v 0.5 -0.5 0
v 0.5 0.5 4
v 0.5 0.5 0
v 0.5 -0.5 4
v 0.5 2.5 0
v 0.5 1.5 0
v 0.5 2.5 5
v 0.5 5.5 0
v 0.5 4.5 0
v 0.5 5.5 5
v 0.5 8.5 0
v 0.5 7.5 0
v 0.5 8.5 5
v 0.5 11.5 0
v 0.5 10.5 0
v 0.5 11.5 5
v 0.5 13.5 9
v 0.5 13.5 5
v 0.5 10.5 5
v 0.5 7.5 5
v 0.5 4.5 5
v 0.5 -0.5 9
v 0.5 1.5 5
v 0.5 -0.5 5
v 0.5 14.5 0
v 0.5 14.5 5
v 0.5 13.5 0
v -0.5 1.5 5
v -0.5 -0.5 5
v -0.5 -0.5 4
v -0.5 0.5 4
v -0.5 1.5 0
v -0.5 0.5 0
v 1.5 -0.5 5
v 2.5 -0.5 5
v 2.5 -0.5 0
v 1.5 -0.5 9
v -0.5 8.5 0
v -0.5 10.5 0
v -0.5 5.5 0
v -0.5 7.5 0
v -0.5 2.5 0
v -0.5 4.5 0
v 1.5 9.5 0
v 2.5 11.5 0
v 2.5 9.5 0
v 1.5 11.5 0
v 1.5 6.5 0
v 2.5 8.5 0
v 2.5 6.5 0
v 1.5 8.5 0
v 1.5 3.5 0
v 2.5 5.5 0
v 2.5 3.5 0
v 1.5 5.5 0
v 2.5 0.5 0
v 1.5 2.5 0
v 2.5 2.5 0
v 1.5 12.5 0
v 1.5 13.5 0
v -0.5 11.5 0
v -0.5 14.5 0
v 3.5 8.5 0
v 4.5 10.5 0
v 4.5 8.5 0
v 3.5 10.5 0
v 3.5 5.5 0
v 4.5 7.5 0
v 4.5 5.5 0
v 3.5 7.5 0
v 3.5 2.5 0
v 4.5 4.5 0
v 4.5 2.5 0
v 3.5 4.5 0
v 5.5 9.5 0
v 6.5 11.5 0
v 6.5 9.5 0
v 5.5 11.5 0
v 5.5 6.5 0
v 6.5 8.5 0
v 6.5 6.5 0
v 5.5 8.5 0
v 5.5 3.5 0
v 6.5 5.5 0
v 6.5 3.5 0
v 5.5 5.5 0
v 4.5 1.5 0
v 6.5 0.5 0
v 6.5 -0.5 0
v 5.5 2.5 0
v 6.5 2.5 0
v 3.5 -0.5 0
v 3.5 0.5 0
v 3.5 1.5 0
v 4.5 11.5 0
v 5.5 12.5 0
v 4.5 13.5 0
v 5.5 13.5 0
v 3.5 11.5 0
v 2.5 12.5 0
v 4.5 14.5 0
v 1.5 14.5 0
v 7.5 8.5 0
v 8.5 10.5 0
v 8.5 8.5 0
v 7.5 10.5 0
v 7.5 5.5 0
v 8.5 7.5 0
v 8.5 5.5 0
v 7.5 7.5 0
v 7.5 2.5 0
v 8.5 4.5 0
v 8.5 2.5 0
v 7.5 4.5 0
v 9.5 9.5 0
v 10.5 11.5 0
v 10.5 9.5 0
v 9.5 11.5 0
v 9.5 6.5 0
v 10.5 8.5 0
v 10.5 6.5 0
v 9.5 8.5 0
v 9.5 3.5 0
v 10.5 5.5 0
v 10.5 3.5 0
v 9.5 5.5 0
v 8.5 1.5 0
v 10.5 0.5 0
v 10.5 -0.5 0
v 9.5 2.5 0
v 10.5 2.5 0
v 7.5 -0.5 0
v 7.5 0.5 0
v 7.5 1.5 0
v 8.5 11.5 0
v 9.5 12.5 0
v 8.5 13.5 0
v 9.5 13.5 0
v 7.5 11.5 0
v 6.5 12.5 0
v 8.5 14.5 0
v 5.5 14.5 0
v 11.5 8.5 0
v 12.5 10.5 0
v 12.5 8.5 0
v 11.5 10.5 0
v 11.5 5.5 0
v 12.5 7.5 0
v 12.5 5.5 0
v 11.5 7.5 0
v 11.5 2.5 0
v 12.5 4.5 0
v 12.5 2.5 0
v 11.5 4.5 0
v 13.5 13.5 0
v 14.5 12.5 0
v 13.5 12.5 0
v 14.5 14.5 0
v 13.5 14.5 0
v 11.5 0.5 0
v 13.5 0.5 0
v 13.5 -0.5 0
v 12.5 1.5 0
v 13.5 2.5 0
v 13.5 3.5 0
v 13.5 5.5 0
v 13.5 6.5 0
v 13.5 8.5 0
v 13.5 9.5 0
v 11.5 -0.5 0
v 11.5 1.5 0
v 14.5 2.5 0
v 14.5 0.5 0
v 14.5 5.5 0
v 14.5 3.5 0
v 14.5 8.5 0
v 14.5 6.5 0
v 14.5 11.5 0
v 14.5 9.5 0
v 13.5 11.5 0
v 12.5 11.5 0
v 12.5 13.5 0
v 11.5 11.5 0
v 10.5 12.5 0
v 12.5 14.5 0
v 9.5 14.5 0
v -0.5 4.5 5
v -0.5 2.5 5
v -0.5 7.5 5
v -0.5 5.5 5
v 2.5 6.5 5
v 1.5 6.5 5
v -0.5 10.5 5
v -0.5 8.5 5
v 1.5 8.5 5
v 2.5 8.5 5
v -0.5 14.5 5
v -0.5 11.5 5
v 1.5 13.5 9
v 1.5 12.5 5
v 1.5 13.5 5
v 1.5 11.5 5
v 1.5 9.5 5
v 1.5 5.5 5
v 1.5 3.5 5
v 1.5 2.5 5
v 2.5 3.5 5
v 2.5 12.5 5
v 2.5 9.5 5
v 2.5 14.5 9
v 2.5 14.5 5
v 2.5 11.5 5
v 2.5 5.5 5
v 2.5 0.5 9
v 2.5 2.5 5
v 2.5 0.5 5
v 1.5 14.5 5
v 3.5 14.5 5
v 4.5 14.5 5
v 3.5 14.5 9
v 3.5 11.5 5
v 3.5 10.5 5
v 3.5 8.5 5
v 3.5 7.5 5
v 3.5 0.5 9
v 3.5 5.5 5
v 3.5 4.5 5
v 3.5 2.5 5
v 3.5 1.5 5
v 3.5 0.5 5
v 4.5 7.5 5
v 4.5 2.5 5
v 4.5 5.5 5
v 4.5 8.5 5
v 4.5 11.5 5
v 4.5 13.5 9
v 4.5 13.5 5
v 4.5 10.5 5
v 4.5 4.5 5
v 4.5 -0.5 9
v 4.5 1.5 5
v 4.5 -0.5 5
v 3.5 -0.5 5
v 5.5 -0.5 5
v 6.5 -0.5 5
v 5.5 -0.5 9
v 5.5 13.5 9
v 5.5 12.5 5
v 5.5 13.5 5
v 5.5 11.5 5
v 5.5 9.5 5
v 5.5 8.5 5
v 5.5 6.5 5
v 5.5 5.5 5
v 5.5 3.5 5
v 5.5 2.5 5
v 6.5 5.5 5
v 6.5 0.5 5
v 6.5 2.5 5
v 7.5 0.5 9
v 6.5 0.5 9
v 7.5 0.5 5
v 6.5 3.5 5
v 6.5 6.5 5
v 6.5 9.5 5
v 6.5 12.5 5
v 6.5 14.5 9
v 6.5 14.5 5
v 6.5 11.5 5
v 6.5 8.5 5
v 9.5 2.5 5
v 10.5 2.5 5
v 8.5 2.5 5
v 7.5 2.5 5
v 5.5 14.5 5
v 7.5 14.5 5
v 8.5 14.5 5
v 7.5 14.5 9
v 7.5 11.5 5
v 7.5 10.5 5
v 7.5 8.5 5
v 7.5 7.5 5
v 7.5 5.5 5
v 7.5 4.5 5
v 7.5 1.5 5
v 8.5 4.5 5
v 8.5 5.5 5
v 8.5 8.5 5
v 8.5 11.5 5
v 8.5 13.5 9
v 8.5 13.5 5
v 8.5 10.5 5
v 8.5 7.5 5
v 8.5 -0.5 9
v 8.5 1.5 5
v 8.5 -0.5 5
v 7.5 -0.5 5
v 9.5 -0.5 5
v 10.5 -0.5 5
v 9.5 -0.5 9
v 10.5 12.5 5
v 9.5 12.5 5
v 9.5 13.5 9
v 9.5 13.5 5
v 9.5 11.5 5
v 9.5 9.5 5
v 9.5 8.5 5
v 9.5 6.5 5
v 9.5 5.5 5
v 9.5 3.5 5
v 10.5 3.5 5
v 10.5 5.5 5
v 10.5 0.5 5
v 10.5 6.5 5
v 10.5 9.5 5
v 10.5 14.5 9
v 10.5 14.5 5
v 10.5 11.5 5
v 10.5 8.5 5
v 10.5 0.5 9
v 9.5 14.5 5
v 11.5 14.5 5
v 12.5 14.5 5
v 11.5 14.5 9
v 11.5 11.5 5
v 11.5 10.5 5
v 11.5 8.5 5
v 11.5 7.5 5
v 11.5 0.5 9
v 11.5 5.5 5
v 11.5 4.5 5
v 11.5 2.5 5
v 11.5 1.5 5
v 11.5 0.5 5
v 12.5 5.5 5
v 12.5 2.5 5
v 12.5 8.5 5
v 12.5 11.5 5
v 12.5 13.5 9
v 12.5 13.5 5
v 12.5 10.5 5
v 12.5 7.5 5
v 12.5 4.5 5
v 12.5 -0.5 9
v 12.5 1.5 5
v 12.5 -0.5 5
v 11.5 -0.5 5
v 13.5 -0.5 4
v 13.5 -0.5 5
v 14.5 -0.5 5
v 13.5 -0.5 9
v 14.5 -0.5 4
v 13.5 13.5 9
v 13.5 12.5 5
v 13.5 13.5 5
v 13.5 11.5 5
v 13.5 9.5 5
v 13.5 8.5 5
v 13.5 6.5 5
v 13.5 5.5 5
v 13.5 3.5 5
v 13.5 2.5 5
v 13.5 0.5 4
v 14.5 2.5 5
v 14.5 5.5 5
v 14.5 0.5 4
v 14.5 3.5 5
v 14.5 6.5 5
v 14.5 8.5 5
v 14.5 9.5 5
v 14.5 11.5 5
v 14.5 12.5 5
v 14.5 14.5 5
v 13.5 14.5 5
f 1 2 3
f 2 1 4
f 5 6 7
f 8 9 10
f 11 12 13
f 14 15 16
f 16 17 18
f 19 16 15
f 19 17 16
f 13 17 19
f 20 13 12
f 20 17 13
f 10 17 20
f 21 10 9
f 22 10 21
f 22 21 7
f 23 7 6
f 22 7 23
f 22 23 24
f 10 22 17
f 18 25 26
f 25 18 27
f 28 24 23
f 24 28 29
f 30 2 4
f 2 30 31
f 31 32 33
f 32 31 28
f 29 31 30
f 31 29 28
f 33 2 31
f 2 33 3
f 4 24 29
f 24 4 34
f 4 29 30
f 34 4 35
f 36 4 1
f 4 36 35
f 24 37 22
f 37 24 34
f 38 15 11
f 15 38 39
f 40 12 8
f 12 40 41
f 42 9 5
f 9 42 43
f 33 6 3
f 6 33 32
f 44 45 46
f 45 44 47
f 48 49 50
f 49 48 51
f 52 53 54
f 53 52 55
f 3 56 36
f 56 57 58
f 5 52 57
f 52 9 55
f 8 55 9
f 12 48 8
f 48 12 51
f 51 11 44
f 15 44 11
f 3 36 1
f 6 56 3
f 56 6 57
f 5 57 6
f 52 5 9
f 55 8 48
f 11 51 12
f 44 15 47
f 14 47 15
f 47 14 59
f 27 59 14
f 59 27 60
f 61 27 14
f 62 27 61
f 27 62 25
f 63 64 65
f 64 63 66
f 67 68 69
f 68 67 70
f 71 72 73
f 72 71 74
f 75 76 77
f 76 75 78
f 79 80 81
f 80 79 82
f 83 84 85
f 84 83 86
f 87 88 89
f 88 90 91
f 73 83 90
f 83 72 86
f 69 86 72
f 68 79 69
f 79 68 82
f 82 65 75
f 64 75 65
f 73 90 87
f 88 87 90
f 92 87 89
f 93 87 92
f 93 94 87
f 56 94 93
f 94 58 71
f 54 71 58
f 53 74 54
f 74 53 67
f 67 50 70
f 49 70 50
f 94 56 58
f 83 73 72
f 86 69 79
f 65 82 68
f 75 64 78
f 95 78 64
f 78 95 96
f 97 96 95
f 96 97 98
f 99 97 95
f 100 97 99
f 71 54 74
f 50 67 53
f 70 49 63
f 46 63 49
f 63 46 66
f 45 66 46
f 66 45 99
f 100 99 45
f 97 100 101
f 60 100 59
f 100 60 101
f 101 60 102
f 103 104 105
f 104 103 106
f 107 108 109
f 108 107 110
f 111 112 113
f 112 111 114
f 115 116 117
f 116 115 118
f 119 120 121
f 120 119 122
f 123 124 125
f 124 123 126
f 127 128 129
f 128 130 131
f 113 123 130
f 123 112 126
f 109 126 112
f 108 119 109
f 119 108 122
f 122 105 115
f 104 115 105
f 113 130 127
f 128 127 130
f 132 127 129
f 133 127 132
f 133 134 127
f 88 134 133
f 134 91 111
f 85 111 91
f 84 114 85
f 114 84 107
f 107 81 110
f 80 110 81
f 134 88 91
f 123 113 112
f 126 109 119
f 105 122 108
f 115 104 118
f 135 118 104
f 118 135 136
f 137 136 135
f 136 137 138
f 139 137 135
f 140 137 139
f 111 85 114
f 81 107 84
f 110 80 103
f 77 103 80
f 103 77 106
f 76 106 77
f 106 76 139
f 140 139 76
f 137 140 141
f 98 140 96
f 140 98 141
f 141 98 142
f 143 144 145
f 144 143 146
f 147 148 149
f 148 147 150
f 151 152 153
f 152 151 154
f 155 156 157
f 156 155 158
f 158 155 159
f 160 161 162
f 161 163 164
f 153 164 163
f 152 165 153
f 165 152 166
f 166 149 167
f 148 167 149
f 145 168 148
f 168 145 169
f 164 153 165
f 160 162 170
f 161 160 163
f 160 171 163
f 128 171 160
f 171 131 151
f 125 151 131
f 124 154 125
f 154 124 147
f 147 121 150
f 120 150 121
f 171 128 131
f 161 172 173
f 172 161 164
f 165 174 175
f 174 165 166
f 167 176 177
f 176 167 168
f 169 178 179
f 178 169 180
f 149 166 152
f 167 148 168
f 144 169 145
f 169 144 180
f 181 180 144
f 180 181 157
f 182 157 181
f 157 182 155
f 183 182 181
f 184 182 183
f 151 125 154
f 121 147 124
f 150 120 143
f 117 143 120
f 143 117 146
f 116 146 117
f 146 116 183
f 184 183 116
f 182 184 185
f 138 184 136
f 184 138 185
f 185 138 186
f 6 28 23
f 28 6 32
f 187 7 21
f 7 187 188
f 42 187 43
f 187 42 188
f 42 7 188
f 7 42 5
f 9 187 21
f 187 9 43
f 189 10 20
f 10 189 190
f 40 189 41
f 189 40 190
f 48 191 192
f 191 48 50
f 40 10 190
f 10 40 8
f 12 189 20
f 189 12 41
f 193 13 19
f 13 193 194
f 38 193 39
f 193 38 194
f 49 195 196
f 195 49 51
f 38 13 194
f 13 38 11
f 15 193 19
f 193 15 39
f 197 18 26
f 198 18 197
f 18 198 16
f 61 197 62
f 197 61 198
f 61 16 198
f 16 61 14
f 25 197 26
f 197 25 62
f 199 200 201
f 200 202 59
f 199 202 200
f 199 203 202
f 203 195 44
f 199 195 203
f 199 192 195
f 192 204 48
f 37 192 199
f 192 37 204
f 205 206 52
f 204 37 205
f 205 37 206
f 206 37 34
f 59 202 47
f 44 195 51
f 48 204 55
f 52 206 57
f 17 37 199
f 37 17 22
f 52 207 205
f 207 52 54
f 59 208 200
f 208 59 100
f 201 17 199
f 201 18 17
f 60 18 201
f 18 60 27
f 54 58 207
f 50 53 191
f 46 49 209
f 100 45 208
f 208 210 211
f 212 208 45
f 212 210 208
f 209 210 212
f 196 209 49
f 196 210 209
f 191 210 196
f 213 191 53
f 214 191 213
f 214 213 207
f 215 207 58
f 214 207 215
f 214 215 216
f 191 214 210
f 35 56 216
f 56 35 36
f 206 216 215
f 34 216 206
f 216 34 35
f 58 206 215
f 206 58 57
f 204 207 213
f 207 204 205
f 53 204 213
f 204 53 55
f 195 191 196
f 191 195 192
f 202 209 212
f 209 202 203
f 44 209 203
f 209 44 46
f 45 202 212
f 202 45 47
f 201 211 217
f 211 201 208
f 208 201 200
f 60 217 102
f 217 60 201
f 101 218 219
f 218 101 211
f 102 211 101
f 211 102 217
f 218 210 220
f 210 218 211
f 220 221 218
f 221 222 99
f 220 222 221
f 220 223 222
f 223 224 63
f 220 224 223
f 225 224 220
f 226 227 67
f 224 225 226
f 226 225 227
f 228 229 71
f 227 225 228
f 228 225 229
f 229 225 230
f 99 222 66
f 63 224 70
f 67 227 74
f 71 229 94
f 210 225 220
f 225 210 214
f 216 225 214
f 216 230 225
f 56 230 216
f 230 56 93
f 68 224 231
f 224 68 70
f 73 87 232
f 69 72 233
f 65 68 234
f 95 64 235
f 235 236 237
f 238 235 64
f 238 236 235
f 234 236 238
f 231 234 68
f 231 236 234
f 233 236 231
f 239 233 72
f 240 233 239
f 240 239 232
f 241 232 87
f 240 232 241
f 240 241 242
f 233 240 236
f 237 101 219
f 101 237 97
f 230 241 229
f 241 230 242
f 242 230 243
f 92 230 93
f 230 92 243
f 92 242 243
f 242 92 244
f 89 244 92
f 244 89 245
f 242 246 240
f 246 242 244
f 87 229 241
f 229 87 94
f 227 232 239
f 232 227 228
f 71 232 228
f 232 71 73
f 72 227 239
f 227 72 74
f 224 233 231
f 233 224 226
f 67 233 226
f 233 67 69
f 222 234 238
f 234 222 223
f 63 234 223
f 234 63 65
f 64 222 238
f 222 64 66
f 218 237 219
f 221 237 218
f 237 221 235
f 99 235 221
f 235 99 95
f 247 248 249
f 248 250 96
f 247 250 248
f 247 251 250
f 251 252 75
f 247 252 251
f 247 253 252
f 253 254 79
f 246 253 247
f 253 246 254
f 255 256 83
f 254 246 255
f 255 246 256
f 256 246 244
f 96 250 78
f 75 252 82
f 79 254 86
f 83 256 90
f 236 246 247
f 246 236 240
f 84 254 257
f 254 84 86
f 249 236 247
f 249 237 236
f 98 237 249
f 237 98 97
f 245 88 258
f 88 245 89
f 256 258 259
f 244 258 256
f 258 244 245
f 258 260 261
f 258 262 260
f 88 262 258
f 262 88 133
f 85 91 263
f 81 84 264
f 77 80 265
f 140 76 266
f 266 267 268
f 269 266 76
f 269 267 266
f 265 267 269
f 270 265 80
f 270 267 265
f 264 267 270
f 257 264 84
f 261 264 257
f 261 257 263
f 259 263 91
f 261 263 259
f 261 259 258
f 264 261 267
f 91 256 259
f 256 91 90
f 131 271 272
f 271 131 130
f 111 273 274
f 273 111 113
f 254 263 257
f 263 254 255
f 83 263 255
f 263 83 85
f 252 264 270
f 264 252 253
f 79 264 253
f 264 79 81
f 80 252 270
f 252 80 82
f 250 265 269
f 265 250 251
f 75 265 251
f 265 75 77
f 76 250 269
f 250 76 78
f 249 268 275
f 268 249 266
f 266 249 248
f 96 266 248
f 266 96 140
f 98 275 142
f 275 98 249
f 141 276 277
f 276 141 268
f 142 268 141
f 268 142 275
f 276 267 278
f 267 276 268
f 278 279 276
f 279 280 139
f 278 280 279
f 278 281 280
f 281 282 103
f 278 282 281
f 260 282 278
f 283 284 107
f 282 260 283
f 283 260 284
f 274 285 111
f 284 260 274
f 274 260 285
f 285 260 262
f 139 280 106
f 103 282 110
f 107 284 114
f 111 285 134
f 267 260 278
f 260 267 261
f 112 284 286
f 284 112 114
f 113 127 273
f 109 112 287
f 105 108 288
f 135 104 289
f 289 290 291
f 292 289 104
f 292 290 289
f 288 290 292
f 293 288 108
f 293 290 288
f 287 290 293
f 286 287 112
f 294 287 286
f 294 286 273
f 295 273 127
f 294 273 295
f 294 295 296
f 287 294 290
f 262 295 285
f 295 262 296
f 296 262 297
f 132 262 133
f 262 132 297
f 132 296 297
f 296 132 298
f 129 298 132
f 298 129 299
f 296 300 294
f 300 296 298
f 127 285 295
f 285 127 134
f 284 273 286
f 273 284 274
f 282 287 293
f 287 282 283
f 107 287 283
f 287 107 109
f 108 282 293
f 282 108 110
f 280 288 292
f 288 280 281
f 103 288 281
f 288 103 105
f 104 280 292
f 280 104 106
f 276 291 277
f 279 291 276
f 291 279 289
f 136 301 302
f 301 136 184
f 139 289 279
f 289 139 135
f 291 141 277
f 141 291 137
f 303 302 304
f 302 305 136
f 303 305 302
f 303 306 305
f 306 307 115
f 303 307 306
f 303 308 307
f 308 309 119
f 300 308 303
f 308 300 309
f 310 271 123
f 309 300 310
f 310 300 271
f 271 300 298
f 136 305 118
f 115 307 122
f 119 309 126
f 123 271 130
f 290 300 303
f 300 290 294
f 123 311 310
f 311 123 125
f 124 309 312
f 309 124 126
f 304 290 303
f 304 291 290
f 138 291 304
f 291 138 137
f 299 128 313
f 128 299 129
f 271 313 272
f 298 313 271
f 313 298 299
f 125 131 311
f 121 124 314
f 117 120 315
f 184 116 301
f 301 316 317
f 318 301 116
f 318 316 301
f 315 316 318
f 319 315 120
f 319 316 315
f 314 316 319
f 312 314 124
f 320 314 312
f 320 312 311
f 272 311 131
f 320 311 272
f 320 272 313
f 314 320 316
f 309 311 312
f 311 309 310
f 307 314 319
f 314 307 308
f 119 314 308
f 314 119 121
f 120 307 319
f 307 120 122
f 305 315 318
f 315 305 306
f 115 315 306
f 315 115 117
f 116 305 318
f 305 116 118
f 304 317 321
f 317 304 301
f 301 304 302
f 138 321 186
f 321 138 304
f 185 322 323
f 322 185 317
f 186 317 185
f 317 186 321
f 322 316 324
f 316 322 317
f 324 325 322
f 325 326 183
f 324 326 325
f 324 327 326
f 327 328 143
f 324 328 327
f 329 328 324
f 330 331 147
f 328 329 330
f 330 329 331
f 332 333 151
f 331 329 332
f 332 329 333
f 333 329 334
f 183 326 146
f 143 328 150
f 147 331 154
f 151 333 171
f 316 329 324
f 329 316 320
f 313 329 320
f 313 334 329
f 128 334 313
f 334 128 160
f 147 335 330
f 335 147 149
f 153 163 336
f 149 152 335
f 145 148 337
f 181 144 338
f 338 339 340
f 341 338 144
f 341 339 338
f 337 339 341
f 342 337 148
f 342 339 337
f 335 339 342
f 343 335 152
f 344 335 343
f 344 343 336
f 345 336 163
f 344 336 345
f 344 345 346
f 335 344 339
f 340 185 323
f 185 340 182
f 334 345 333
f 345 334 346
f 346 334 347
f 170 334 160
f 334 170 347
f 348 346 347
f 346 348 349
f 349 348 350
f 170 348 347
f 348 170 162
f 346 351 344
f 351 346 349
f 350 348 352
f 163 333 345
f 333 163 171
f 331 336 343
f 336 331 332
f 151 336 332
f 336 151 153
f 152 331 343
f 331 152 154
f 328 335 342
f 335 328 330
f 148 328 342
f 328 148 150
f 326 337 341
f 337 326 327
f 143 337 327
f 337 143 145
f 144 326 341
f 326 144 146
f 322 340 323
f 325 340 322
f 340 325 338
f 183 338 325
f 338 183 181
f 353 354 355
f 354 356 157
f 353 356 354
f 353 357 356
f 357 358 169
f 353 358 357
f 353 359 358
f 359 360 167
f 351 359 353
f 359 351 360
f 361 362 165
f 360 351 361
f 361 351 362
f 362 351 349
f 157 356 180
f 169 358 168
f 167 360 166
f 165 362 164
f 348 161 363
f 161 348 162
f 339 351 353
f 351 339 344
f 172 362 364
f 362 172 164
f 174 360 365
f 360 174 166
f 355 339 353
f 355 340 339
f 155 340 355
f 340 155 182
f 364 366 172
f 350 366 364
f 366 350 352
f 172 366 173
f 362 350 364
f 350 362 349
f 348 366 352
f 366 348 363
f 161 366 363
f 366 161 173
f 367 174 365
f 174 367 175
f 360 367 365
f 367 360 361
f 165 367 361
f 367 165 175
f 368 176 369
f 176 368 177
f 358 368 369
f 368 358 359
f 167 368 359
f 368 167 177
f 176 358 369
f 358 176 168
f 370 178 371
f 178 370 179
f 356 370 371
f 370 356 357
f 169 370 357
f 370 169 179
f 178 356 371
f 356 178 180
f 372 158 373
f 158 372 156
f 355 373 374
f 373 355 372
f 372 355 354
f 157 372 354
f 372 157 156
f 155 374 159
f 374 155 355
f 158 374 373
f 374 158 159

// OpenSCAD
union() {
    translate([0, 0, 4.5]) color([1, 0, 0]) cube([1, 1, 1], center=true);
    translate([0, 1, 2.5]) cube([1, 1, 5], center=true);
    translate([0, 3, 2.5]) cube([1, 1, 5], center=true);
    translate([0, 4, 2.5]) cube([1, 1, 5], center=true);
    translate([0, 6, 2.5]) cube([1, 1, 5], center=true);
    translate([0, 7, 2.5]) cube([1, 1, 5], center=true);
    translate([0, 9, 2.5]) cube([1, 1, 5], center=true);
    translate([0, 10, 2.5]) cube([1, 1, 5], center=true);
    translate([0, 12, 2.5]) cube([1, 1, 5], center=true);
    translate([0, 13, 2.5]) cube([1, 1, 5], center=true);
    translate([0, 14, 2.5]) cube([1, 1, 5], center=true);
    translate([1, 0, 4.5]) cube([1, 1, 9], center=true);
    translate([1, 1, 4.5]) cube([1, 1, 9], center=true);
    translate([1, 2, 4.5]) cube([1, 1, 9], center=true);
    translate([1, 3, 4.5]) cube([1, 1, 9], center=true);
    translate([1, 4, 4.5]) cube([1, 1, 9], center=true);
    translate([1, 5, 4.5]) cube([1, 1, 9], center=true);
    translate([1, 6, 4.5]) cube([1, 1, 9], center=true);
    translate([1, 7, 4.5]) cube([1, 1, 9], center=true);
    translate([1, 8, 4.5]) cube([1, 1, 9], center=true);
    translate([1, 9, 4.5]) cube([1, 1, 9], center=true);
    translate([1, 10, 4.5]) cube([1, 1, 9], center=true);
    translate([1, 11, 4.5]) cube([1, 1, 9], center=true);
    translate([1, 12, 4.5]) cube([1, 1, 9], center=true);
    translate([1, 13, 4.5]) cube([1, 1, 9], center=true);
    translate([2, 0, 2.5]) cube([1, 1, 5], center=true);
    translate([2, 1, 2.5]) cube([1, 1, 5], center=true);
    translate([2, 2, 2.5]) cube([1, 1, 5], center=true);
    translate([2, 4, 2.5]) cube([1, 1, 5], center=true);
    translate([2, 5, 2.5]) cube([1, 1, 5], center=true);
    translate([2, 7, 2.5]) cube([1, 1, 5], center=true);
    translate([2, 8, 2.5]) cube([1, 1, 5], center=true);
    translate([2, 10, 2.5]) cube([1, 1, 5], center=true);
    translate([2, 11, 2.5]) cube([1, 1, 5], center=true);
    translate([2, 13, 2.5]) cube([1, 1, 5], center=true);
    translate([2, 14, 2.5]) cube([1, 1, 5], center=true);
    translate([3, 1, 4.5]) cube([1, 1, 9], center=true);
    translate([3, 2, 4.5]) cube([1, 1, 9], center=true);
    translate([3, 3, 4.5]) cube([1, 1, 9], center=true);
    translate([3, 4, 4.5]) cube([1, 1, 9], center=true);
    translate([3, 5, 4.5]) cube([1, 1, 9], center=true);
    translate([3, 6, 4.5]) cube([1, 1, 9], center=true);
    translate([3, 7, 4.5]) cube([1, 1, 9], center=true);
    translate([3, 8, 4.5]) cube([1, 1, 9], center=true);
    translate([3, 9, 4.5]) cube([1, 1, 9], center=true);
    translate([3, 10, 4.5]) cube([1, 1, 9], center=true);
    translate([3, 11, 4.5]) cube([1, 1, 9], center=true);
    translate([3, 12, 4.5]) cube([1, 1, 9], center=true);
    translate([3, 13, 4.5]) cube([1, 1, 9], center=true);
    translate([3, 14, 4.5]) cube([1, 1, 9], center=true);
    translate([4, 0, 2.5]) cube([1, 1, 5], center=true);
    translate([4, 1, 2.5]) cube([1, 1, 5], center=true);
    translate([4, 3, 2.5]) cube([1, 1, 5], center=true);
    translate([4, 4, 2.5]) cube([1, 1, 5], center=true);
    translate([4, 6, 2.5]) cube([1, 1, 5], center=true);
    translate([4, 7, 2.5]) cube([1, 1, 5], center=true);
    translate([4, 9, 2.5]) cube([1, 1, 5], center=true);
    translate([4, 10, 2.5]) cube([1, 1, 5], center=true);
    translate([4, 12, 2.5]) cube([1, 1, 5], center=true);
    translate([4, 13, 2.5]) cube([1, 1, 5], center=true);
    translate([4, 14, 2.5]) cube([1, 1, 5], center=true);
    translate([5, 0, 4.5]) cube([1, 1, 9], center=true);
    translate([5, 1, 4.5]) cube([1, 1, 9], center=true);
    translate([5, 2, 4.5]) cube([1, 1, 9], center=true);
    translate([5, 3, 4.5]) cube([1, 1, 9], center=true);
    translate([5, 4, 4.5]) cube([1, 1, 9], center=true);
    translate([5, 5, 4.5]) cube([1, 1, 9], center=true);
    translate([5, 6, 4.5]) cube([1, 1, 9], center=true);
    translate([5, 7, 4.5]) cube([1, 1, 9], center=true);
    translate([5, 8, 4.5]) cube([1, 1, 9], center=true);
    translate([5, 9, 4.5]) cube([1, 1, 9], center=true);
    translate([5, 10, 4.5]) cube([1, 1, 9], center=true);
    translate([5, 11, 4.5]) cube([1, 1, 9], center=true);
    translate([5, 12, 4.5]) cube([1, 1, 9], center=true);
    translate([5, 13, 4.5]) cube([1, 1, 9], center=true);
    translate([6, 0, 2.5]) cube([1, 1, 5], center=true);
    translate([6, 1, 2.5]) cube([1, 1, 5], center=true);
    translate([6, 2, 2.5]) cube([1, 1, 5], center=true);
    translate([6, 4, 2.5]) cube([1, 1, 5], center=true);
    translate([6, 5, 2.5]) cube([1, 1, 5], center=true);
    translate([6, 7, 2.5]) cube([1, 1, 5], center=true);
    translate([6, 8, 2.5]) cube([1, 1, 5], center=true);
    translate([6, 10, 2.5]) cube([1, 1, 5], center=true);
    translate([6, 11, 2.5]) cube([1, 1, 5], center=true);
    translate([6, 13, 2.5]) cube([1, 1, 5], center=true);
    translate([6, 14, 2.5]) cube([1, 1, 5], center=true);
    translate([7, 1, 4.5]) cube([1, 1, 9], center=true);
    translate([7, 2, 4.5]) cube([1, 1, 9], center=true);
    translate([7, 3, 4.5]) cube([1, 1, 9], center=true);
    translate([7, 4, 4.5]) cube([1, 1, 9], center=true);
    translate([7, 5, 4.5]) cube([1, 1, 9], center=true);
    translate([7, 6, 4.5]) cube([1, 1, 9], center=true);
    translate([7, 7, 4.5]) cube([1, 1, 9], center=true);
    translate([7, 8, 4.5]) cube([1, 1, 9], center=true);
    translate([7, 9, 4.5]) cube([1, 1, 9], center=true);
    translate([7, 10, 4.5]) cube([1, 1, 9], center=true);
    translate([7, 11, 4.5]) cube([1, 1, 9], center=true);
    translate([7, 12, 4.5]) cube([1, 1, 9], center=true);
    translate([7, 13, 4.5]) cube([1, 1, 9], center=true);
    translate([7, 14, 4.5]) cube([1, 1, 9], center=true);
    translate([8, 0, 2.5]) cube([1, 1, 5], center=true);
    translate([8, 1, 2.5]) cube([1, 1, 5], center=true);
    translate([8, 3, 2.5]) cube([1, 1, 5], center=true);
    translate([8, 4, 2.5]) cube([1, 1, 5], center=true);
    translate([8, 6, 2.5]) cube([1, 1, 5], center=true);
    translate([8, 7, 2.5]) cube([1, 1, 5], center=true);
    translate([8, 9, 2.5]) cube([1, 1, 5], center=true);
    translate([8, 10, 2.5]) cube([1, 1, 5], center=true);
    translate([8, 12, 2.5]) cube([1, 1, 5], center=true);
    translate([8, 13, 2.5]) cube([1, 1, 5], center=true);
    translate([8, 14, 2.5]) cube([1, 1, 5], center=true);
    translate([9, 0, 4.5]) cube([1, 1, 9], center=true);
    translate([9, 1, 4.5]) cube([1, 1, 9], center=true);
    translate([9, 2, 4.5]) cube([1, 1, 9], center=true);
    translate([9, 3, 4.5]) cube([1, 1, 9], center=true);
    translate([9, 4, 4.5]) cube([1, 1, 9], center=true);
    translate([9, 5, 4.5]) cube([1, 1, 9], center=true);
    translate([9, 6, 4.5]) cube([1, 1, 9], center=true);
    translate([9, 7, 4.5]) cube([1, 1, 9], center=true);
    translate([9, 8, 4.5]) cube([1, 1, 9], center=true);
    translate([9, 9, 4.5]) cube([1, 1, 9], center=true);
    translate([9, 10, 4.5]) cube([1, 1, 9], center=true);
    translate([9, 11, 4.5]) cube([1, 1, 9], center=true);
    translate([9, 12, 4.5]) cube([1, 1, 9], center=true);
    translate([9, 13, 4.5]) cube([1, 1, 9], center=true);
    translate([10, 0, 2.5]) cube([1, 1, 5], center=true);
    translate([10, 1, 2.5]) cube([1, 1, 5], center=true);
    translate([10, 2, 2.5]) cube([1, 1, 5], center=true);
    translate([10, 4, 2.5]) cube([1, 1, 5], center=true);
    translate([10, 5, 2.5]) cube([1, 1, 5], center=true);
    translate([10, 7, 2.5]) cube([1, 1, 5], center=true);
    translate([10, 8, 2.5]) cube([1, 1, 5], center=true);
    translate([10, 10, 2.5]) cube([1, 1, 5], center=true);
    translate([10, 11, 2.5]) cube([1, 1, 5], center=true);
    translate([10, 13, 2.5]) cube([1, 1, 5], center=true);
    translate([10, 14, 2.5]) cube([1, 1, 5], center=true);
    translate([11, 1, 4.5]) cube([1, 1, 9], center=true);
    translate([11, 2, 4.5]) cube([1, 1, 9], center=true);
    translate([11, 3, 4.5]) cube([1, 1, 9], center=true);
    translate([11, 4, 4.5]) cube([1, 1, 9], center=true);
    translate([11, 5, 4.5]) cube([1, 1, 9], center=true);
    translate([11, 6, 4.5]) cube([1, 1, 9], center=true);
    translate([11, 7, 4.5]) cube([1, 1, 9], center=true);
    translate([11, 8, 4.5]) cube([1, 1, 9], center=true);
    translate([11, 9, 4.5]) cube([1, 1, 9], center=true);
    translate([11, 10, 4.5]) cube([1, 1, 9], center=true);
    translate([11, 11, 4.5]) cube([1, 1, 9], center=true);
    translate([11, 12, 4.5]) cube([1, 1, 9], center=true);
    translate([11, 13, 4.5]) cube([1, 1, 9], center=true);
    translate([11, 14, 4.5]) cube([1, 1, 9], center=true);
    translate([12, 0, 2.5]) cube([1, 1, 5], center=true);
    translate([12, 1, 2.5]) cube([1, 1, 5], center=true);
    translate([12, 3, 2.5]) cube([1, 1, 5], center=true);
    translate([12, 4, 2.5]) cube([1, 1, 5], center=true);
    translate([12, 6, 2.5]) cube([1, 1, 5], center=true);
    translate([12, 7, 2.5]) cube([1, 1, 5], center=true);
    translate([12, 9, 2.5]) cube([1, 1, 5], center=true);
    translate([12, 10, 2.5]) cube([1, 1, 5], center=true);
    translate([12, 12, 2.5]) cube([1, 1, 5], center=true);
    translate([12, 13, 2.5]) cube([1, 1, 5], center=true);
    translate([12, 14, 2.5]) cube([1, 1, 5], center=true);
    translate([13, 0, 4.5]) cube([1, 1, 9], center=true);
    translate([13, 1, 4.5]) cube([1, 1, 9], center=true);
    translate([13, 2, 4.5]) cube([1, 1, 9], center=true);
    translate([13, 3, 4.5]) cube([1, 1, 9], center=true);
    translate([13, 4, 4.5]) cube([1, 1, 9], center=true);
    translate([13, 5, 4.5]) cube([1, 1, 9], center=true);
    translate([13, 6, 4.5]) cube([1, 1, 9], center=true);
    translate([13, 7, 4.5]) cube([1, 1, 9], center=true);
    translate([13, 8, 4.5]) cube([1, 1, 9], center=true);
    translate([13, 9, 4.5]) cube([1, 1, 9], center=true);
    translate([13, 10, 4.5]) cube([1, 1, 9], center=true);
    translate([13, 11, 4.5]) cube([1, 1, 9], center=true);
    translate([13, 12, 4.5]) cube([1, 1, 9], center=true);
    translate([13, 13, 4.5]) cube([1, 1, 9], center=true);
    translate([14, 0, 4.5]) color([0, 0, 1]) cube([1, 1, 1], center=true);
    translate([14, 1, 2.5]) cube([1, 1, 5], center=true);
    translate([14, 2, 2.5]) cube([1, 1, 5], center=true);
    translate([14, 4, 2.5]) cube([1, 1, 5], center=true);
    translate([14, 5, 2.5]) cube([1, 1, 5], center=true);
    translate([14, 7, 2.5]) cube([1, 1, 5], center=true);
    translate([14, 8, 2.5]) cube([1, 1, 5], center=true);
    translate([14, 10, 2.5]) cube([1, 1, 5], center=true);
    translate([14, 11, 2.5]) cube([1, 1, 5], center=true);
    translate([14, 13, 2.5]) cube([1, 1, 5], center=true);
    translate([14, 14, 2.5]) cube([1, 1, 5], center=true);
}
